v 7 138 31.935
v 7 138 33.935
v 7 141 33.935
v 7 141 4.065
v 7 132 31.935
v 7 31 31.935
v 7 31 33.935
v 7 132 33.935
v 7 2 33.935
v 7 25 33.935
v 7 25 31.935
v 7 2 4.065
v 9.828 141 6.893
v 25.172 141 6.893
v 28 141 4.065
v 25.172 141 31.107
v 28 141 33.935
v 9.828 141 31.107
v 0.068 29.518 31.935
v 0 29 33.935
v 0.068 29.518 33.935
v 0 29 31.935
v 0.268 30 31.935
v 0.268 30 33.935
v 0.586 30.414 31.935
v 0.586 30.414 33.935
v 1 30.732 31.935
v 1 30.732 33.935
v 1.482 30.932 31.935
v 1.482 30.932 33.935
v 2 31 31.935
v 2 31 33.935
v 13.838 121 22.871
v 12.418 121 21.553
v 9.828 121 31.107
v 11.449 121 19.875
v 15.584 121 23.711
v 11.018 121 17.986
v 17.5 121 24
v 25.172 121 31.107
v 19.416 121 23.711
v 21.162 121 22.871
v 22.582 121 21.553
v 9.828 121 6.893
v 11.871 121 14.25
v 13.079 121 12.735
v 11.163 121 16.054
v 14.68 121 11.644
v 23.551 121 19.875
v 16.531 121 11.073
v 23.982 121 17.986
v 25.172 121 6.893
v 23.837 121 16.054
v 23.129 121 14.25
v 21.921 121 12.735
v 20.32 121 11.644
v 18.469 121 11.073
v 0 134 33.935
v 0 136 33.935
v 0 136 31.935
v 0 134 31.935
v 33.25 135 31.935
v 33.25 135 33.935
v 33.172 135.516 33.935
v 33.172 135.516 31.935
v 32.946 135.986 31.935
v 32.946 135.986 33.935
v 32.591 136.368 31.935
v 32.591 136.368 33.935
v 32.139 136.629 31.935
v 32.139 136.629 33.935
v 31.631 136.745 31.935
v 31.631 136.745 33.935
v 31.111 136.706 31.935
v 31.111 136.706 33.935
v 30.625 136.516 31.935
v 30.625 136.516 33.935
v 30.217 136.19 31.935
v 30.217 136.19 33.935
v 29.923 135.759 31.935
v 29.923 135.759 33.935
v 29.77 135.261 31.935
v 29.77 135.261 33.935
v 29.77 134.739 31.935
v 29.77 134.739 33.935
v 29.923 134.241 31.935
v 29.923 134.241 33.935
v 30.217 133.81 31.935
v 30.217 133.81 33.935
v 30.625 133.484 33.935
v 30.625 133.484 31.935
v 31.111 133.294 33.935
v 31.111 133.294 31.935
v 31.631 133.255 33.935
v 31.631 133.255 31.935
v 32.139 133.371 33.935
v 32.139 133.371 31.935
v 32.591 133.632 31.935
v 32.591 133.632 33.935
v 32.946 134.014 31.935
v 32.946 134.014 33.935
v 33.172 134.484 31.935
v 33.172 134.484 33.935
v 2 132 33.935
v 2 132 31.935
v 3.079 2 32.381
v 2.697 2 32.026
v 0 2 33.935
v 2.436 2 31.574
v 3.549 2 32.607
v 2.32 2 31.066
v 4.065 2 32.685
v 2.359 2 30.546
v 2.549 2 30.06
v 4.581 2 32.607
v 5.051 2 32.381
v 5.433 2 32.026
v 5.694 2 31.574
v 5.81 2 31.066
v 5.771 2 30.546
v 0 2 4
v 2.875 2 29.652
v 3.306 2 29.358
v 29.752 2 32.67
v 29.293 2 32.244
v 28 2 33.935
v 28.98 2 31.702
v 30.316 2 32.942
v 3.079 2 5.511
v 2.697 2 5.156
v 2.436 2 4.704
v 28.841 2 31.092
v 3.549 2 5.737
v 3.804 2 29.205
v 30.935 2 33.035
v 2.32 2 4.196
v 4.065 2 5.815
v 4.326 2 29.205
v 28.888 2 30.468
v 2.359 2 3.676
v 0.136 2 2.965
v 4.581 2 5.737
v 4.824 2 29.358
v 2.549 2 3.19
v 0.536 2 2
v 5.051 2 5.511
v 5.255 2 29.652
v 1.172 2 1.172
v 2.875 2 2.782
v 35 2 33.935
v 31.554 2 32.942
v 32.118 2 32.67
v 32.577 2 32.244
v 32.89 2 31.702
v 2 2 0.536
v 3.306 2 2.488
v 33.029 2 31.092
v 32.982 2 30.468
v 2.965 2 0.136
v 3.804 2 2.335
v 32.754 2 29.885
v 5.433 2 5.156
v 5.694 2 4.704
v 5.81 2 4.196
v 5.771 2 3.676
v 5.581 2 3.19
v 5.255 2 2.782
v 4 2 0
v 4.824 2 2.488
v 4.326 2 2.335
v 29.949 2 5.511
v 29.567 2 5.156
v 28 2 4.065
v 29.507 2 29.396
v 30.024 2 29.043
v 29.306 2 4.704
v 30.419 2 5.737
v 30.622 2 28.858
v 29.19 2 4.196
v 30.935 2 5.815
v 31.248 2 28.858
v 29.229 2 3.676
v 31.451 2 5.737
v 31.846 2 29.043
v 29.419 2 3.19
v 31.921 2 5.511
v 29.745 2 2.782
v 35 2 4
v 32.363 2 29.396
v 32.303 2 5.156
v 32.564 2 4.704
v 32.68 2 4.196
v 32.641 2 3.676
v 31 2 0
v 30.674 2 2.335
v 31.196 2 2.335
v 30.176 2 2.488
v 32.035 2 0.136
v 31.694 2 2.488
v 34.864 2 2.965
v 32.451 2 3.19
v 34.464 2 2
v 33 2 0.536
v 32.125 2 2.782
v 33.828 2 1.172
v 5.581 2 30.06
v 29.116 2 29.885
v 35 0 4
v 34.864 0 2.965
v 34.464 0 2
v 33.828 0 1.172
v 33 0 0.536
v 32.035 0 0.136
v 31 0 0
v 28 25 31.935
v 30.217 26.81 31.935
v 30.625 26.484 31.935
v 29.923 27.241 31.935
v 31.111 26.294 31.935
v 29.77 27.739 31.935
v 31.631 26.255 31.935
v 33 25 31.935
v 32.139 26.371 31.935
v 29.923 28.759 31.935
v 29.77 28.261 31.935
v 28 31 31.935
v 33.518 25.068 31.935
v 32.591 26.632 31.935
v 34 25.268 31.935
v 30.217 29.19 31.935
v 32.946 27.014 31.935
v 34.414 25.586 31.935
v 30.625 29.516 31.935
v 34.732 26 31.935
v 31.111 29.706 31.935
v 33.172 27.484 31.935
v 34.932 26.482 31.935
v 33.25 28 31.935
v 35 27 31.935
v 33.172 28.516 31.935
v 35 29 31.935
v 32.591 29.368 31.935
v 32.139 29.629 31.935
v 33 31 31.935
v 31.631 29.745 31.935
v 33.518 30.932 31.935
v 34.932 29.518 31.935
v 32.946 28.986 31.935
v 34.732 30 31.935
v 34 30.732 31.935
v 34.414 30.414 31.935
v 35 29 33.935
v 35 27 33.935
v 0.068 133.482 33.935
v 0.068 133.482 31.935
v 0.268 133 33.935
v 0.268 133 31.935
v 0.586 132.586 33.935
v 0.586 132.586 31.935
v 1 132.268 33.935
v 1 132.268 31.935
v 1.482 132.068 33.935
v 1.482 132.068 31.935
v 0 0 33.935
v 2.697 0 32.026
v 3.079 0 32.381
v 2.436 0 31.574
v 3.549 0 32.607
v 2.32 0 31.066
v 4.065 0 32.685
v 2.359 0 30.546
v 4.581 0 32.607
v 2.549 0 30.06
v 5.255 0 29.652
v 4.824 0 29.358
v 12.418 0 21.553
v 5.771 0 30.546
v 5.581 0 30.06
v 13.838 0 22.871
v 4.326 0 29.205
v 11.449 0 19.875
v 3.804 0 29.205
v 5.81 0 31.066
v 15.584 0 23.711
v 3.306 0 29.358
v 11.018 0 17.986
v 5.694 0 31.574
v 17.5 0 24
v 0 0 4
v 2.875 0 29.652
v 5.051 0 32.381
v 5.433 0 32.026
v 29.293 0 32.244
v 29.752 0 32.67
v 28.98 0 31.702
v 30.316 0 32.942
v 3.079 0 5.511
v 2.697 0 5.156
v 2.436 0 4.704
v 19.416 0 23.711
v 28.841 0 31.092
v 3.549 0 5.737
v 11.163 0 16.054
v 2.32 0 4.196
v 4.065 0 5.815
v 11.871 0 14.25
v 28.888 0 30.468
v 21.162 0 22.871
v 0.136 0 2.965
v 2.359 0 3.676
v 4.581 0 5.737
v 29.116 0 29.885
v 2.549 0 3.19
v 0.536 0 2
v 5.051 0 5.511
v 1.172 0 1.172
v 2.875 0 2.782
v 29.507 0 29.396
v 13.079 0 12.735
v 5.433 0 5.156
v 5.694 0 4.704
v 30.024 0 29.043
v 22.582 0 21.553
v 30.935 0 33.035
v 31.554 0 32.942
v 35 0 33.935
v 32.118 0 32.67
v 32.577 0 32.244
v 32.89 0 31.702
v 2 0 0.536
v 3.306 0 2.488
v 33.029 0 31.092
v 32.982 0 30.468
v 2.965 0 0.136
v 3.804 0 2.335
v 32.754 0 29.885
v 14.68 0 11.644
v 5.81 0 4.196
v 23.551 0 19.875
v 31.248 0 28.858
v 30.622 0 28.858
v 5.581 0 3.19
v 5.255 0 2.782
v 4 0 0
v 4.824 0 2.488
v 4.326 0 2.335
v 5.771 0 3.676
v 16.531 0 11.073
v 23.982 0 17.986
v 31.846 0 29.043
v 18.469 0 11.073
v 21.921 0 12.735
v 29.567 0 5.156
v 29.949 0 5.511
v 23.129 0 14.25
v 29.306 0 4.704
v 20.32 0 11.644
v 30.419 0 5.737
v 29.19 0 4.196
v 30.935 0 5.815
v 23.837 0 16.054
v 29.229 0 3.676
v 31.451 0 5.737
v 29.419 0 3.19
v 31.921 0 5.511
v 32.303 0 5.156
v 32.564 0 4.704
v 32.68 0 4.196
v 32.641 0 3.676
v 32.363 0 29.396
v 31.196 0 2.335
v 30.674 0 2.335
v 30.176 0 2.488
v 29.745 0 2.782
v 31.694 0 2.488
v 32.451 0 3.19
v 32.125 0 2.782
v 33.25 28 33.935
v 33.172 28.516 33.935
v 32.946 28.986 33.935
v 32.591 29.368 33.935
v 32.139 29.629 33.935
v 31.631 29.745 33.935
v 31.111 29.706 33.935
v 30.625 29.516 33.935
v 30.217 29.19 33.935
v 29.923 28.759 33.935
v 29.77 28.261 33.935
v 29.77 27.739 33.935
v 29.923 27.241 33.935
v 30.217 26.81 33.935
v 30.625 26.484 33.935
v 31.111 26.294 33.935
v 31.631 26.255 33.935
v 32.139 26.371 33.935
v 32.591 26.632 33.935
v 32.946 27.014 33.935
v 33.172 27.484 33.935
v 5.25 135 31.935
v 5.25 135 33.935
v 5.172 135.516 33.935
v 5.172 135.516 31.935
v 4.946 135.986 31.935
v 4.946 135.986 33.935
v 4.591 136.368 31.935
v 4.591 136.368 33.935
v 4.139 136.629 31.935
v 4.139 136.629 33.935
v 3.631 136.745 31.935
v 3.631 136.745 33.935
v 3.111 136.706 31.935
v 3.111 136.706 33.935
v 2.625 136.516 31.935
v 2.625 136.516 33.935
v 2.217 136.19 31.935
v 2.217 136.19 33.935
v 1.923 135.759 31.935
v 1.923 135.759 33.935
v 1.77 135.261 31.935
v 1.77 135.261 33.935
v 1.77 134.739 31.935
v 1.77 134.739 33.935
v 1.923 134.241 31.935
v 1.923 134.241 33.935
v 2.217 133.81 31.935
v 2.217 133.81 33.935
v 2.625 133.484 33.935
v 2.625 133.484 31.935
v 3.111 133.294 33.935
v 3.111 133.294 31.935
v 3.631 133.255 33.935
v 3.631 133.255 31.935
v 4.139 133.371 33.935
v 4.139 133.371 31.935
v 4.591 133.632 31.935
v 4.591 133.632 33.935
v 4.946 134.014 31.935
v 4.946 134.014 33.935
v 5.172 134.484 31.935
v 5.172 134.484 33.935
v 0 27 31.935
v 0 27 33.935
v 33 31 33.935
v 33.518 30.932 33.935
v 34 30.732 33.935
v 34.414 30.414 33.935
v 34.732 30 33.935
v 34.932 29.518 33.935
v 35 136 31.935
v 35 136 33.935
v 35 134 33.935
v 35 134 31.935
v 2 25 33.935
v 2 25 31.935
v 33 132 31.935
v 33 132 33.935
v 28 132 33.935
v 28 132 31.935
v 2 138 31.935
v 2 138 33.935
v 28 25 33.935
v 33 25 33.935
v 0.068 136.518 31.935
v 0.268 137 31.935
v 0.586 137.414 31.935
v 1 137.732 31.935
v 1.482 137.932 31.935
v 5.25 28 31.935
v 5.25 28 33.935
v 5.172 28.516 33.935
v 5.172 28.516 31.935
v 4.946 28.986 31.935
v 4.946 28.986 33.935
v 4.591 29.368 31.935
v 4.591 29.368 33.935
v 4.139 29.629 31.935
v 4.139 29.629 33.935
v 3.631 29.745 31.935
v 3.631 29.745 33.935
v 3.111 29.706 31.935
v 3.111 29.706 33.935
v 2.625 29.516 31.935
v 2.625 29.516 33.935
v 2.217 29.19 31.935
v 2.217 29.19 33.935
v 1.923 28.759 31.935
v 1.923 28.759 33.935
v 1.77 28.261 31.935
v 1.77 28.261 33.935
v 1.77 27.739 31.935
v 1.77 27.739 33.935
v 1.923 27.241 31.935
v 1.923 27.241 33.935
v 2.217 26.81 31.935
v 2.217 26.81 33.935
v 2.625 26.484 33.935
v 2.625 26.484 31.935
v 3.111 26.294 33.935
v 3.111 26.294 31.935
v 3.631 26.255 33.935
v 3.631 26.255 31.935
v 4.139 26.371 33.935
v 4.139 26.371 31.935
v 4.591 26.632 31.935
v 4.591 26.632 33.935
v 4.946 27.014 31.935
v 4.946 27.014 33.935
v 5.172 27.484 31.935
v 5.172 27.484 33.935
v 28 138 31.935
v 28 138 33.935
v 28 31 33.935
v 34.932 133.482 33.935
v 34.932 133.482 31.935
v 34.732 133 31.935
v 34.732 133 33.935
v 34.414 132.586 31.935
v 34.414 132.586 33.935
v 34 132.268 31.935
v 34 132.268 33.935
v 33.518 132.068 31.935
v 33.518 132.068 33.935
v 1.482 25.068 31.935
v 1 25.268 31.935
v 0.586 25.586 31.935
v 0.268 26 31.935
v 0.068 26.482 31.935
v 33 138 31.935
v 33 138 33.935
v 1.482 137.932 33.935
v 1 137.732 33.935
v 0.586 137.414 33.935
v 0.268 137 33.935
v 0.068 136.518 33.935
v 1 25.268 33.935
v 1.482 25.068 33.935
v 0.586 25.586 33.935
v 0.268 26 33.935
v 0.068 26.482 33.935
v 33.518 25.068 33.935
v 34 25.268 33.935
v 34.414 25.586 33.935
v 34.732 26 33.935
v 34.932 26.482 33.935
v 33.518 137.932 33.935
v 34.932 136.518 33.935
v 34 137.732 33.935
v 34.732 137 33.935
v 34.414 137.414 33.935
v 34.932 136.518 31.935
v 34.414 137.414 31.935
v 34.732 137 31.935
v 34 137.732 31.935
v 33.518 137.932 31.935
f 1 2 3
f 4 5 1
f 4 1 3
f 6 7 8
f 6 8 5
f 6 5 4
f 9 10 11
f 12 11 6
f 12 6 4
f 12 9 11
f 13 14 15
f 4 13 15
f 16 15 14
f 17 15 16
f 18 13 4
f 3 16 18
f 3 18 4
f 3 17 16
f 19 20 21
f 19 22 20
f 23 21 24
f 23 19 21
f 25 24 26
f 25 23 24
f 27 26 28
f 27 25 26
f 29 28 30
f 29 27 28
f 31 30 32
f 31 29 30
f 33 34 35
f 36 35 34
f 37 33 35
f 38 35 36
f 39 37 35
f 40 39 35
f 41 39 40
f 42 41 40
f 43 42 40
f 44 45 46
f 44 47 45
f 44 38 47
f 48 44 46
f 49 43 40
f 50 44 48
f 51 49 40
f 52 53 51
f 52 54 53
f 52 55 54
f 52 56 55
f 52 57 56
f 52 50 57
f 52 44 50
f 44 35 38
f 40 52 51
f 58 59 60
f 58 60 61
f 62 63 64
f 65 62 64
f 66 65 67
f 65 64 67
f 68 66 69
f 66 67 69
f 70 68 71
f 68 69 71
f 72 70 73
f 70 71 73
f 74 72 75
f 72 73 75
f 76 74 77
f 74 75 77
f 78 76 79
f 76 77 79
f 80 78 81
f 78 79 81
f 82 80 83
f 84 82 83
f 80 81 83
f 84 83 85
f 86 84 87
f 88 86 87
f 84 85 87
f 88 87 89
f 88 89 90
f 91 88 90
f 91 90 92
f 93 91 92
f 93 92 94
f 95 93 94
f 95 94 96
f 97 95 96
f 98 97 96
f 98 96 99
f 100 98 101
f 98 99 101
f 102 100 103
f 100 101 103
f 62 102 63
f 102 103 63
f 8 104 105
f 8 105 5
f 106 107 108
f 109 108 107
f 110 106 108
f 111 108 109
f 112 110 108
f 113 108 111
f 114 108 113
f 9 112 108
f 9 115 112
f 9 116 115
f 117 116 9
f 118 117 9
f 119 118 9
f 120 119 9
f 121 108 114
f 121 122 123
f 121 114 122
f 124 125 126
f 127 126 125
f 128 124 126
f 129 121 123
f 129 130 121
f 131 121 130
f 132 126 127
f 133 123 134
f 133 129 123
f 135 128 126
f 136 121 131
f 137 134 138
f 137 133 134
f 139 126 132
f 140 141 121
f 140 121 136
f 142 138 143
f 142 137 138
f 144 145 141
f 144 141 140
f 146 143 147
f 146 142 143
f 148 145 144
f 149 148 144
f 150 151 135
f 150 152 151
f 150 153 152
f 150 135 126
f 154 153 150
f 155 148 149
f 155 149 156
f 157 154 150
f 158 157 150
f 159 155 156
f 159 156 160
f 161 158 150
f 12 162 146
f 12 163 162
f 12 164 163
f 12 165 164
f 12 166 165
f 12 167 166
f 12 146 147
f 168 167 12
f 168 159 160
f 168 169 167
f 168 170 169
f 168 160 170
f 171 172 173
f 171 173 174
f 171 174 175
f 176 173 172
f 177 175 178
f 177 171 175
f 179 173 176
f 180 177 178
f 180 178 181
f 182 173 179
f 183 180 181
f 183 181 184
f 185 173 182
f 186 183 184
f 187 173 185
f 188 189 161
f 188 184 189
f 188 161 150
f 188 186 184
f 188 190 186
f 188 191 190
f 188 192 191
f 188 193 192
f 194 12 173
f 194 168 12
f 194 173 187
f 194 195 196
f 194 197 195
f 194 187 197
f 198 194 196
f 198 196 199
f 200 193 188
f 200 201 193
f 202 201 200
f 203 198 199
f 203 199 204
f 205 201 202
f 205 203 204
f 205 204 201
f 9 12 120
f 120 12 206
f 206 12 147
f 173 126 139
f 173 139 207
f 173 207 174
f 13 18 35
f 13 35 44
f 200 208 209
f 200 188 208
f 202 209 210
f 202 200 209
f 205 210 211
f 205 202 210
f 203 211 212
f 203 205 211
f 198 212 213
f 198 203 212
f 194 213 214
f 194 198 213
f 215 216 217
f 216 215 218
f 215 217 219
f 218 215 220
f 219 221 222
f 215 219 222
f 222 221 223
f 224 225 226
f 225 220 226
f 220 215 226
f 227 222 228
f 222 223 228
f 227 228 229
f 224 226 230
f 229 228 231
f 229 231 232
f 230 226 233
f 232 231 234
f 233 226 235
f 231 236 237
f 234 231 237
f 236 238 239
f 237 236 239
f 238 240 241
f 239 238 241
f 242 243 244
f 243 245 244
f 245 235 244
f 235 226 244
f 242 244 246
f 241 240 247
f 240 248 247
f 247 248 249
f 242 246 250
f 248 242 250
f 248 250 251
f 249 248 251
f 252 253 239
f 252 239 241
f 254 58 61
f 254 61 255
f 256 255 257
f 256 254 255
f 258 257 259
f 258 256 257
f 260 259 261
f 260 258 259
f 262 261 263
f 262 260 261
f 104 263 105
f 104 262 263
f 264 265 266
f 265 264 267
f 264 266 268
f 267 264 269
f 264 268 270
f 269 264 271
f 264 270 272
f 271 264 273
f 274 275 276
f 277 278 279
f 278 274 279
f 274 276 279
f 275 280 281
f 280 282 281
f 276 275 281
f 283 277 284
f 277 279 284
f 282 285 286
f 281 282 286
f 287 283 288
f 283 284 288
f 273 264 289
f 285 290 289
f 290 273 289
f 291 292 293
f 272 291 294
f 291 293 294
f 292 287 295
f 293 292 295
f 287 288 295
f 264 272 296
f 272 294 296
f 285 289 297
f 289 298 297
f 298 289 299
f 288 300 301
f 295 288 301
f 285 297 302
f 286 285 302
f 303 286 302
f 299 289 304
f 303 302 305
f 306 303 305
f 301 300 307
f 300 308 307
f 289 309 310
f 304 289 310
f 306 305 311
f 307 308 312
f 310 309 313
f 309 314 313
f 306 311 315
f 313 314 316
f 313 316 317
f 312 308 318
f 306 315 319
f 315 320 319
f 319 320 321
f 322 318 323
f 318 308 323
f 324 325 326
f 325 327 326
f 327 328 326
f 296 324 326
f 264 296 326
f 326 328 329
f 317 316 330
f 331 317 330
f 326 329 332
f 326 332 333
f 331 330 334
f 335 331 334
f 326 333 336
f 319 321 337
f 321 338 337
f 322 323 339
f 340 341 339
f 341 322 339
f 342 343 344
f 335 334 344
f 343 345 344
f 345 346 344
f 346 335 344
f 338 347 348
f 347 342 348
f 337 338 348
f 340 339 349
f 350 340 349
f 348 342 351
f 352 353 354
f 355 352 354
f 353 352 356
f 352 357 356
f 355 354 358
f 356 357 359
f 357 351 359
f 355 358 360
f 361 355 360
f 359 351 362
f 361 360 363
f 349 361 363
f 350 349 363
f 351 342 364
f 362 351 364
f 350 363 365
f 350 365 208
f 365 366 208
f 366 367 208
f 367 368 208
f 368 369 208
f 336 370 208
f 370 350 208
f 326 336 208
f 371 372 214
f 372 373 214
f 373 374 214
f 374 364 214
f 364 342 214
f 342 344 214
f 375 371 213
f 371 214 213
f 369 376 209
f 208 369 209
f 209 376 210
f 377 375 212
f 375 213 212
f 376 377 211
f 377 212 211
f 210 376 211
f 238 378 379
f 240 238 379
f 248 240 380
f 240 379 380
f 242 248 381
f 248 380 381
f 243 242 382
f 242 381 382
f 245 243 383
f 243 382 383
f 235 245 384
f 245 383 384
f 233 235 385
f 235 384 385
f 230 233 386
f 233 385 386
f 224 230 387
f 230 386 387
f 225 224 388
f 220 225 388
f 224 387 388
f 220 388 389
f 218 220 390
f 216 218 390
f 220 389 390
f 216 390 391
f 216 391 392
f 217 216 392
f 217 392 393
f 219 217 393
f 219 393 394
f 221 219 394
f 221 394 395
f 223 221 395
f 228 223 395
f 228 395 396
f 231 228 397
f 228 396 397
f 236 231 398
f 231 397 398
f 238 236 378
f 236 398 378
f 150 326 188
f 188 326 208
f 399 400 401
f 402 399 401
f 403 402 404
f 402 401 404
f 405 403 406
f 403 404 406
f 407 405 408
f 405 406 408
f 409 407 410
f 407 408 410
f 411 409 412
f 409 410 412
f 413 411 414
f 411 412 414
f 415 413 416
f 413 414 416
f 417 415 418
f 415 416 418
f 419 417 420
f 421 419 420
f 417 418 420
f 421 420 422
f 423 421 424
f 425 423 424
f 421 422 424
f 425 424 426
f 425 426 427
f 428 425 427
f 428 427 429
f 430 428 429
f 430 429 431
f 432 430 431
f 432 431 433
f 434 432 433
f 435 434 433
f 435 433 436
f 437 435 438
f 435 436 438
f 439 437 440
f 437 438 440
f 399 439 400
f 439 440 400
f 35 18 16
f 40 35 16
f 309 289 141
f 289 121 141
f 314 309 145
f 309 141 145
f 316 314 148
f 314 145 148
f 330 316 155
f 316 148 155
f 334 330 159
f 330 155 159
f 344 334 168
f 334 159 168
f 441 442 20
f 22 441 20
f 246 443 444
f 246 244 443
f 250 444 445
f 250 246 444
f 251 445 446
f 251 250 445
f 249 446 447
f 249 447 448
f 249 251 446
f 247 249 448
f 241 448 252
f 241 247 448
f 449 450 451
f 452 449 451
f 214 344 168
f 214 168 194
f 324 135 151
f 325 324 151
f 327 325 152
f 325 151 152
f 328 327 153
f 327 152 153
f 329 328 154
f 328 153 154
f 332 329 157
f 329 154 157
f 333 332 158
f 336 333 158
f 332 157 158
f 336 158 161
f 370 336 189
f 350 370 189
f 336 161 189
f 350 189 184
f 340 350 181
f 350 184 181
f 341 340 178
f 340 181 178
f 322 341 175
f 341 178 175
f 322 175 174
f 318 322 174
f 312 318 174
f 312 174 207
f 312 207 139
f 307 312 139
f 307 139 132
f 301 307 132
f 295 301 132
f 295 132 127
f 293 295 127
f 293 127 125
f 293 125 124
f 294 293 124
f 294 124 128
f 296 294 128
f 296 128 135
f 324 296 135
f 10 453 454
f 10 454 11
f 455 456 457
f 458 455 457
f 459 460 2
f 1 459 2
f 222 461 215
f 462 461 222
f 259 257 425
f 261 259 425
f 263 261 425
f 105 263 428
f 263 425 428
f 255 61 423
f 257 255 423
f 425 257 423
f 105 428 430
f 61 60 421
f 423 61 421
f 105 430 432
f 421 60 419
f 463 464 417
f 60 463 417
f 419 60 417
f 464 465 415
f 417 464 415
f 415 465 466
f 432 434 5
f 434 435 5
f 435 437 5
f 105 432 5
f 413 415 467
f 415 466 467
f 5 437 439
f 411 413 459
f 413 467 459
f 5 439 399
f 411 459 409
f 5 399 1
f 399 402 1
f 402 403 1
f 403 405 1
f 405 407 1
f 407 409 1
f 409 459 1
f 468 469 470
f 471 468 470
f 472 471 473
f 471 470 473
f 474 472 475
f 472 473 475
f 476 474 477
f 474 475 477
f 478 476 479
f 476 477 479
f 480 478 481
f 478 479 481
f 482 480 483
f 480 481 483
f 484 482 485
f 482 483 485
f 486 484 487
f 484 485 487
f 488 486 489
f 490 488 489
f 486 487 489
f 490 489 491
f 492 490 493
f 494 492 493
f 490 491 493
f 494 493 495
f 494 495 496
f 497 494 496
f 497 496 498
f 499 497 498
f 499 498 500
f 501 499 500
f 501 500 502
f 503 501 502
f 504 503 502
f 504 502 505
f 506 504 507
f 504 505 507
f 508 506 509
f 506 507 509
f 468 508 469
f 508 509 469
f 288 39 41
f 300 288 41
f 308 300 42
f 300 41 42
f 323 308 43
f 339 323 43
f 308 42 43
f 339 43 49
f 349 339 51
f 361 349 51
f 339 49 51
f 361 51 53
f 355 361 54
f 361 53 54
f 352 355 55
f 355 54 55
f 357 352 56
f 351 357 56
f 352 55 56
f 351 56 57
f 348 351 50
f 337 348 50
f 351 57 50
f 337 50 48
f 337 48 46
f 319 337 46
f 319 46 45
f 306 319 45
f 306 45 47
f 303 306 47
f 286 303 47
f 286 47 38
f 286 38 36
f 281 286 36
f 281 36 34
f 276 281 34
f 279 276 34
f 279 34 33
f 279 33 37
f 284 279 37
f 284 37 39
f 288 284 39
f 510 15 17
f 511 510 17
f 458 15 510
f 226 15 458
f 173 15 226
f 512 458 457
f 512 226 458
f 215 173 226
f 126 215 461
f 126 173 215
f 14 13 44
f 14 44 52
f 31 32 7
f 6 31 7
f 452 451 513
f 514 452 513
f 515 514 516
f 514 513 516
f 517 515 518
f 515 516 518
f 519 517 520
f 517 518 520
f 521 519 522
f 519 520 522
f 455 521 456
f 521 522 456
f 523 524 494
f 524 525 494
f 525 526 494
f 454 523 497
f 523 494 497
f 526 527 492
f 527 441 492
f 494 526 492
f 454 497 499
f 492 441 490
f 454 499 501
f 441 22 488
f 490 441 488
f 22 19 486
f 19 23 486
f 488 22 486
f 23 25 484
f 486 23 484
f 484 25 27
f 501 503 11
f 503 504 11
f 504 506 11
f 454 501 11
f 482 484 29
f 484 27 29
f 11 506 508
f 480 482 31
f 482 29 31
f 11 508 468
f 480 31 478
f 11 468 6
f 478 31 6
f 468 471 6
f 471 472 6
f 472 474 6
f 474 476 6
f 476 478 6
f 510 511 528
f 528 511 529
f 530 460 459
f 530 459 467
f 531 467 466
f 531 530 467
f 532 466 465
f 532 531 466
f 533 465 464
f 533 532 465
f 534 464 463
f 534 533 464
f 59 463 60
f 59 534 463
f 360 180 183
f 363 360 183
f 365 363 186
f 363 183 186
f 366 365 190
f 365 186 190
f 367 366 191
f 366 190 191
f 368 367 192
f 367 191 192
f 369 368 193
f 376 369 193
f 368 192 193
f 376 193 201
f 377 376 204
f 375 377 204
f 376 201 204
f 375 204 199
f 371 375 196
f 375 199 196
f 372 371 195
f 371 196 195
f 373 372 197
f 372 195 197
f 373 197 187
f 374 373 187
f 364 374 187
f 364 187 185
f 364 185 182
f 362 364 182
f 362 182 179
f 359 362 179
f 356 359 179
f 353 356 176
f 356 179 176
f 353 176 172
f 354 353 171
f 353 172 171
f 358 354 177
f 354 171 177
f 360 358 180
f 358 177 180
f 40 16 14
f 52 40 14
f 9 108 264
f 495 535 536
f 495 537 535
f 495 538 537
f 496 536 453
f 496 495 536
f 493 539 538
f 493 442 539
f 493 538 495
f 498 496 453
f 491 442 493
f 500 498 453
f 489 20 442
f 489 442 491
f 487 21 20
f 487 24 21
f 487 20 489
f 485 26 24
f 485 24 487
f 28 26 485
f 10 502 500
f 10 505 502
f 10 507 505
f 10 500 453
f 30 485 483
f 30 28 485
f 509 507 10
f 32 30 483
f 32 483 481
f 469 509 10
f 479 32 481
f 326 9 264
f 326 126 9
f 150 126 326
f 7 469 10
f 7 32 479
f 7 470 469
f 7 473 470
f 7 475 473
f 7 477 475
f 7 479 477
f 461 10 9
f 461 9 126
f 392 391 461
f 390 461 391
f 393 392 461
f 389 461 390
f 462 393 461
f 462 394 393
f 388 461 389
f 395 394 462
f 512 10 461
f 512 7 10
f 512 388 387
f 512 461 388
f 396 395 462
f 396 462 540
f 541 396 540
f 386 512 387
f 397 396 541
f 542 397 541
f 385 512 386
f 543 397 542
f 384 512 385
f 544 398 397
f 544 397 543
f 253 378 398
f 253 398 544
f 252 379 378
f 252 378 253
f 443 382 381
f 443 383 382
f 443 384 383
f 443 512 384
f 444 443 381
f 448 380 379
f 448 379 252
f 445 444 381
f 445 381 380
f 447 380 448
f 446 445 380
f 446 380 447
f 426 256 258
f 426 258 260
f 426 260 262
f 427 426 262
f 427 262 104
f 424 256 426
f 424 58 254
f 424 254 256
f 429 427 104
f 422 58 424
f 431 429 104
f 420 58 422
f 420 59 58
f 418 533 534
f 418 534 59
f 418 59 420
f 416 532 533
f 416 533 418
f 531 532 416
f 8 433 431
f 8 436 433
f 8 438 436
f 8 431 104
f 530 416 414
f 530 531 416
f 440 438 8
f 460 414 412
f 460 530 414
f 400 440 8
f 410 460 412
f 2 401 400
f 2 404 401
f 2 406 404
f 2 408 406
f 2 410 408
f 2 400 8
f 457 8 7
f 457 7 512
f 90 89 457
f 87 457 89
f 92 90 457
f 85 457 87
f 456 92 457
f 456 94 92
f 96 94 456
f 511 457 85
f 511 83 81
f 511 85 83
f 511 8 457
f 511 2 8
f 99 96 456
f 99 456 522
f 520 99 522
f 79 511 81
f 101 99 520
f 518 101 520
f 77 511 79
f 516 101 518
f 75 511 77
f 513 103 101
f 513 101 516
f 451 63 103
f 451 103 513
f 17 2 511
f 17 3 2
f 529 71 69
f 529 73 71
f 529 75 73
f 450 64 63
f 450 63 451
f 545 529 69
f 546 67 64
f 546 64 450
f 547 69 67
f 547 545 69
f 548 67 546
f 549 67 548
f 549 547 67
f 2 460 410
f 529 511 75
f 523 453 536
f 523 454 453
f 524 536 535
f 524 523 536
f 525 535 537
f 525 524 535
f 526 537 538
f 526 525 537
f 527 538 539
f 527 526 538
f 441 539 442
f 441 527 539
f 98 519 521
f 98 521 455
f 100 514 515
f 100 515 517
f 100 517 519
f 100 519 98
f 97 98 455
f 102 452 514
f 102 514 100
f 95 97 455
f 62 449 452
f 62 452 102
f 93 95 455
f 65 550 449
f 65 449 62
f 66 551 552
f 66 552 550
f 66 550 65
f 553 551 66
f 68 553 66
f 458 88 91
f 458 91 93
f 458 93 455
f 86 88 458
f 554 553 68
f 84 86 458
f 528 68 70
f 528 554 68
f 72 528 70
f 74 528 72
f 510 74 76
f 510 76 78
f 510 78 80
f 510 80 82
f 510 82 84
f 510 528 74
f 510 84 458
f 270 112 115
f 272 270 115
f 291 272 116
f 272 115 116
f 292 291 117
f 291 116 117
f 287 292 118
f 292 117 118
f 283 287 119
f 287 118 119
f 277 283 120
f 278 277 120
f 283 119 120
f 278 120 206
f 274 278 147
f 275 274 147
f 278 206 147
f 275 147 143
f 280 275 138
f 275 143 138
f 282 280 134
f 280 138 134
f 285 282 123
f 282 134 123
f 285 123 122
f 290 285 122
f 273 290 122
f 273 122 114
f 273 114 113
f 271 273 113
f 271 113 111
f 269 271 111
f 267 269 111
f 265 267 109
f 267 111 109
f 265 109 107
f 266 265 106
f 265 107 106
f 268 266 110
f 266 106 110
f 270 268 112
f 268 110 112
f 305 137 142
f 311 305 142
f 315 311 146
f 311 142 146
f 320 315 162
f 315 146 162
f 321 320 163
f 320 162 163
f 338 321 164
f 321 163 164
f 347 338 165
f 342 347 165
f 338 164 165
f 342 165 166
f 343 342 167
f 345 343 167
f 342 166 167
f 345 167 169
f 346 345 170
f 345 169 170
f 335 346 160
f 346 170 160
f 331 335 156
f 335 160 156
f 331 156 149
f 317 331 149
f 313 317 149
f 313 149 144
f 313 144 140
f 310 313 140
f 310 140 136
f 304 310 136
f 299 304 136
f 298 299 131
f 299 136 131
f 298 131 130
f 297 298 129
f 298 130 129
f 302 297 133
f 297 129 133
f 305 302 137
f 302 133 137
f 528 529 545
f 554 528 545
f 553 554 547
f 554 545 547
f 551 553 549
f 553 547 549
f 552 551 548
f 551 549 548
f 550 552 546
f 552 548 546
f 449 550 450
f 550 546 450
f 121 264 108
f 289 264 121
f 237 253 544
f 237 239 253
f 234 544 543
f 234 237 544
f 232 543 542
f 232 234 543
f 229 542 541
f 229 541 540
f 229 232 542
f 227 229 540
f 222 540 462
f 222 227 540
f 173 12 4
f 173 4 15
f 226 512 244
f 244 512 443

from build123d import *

# Parameters (mm, degrees)
ESQUISSE1_W                  = 35
ESQUISSE1_H                  = 35
BOSS_EXTRU_1_DEPTH           = 2
ESQUISSE2_R                  = 1.75
ESQUISSE2_W                  = 35
ESQUISSE2_H                  = 1.064971157
ENL_V_MAT_EXTRU_1_DEPTH      = 2
BOSS_EXTRU_2_DEPTH           = 280
ESQUISSE5_W                  = 7
ESQUISSE5_H                  = 6
ESQUISSE5_R                  = 1.75
BOSS_EXTRU_3_DEPTH           = 2
ESQUISSE6_R                  = 1.75
BOSS_EXTRU_4_DEPTH           = 2
ESQUISSE10_W                 = 35
ESQUISSE10_H                 = 33.935028843
ESQUISSE10_R                 = 1.75
BOSS_EXTRU_5_DEPTH           = 2
ESQUISSE15_R                 = 6.5
ESQUISSE15_R_2               = 1.75
ENL_V_MAT_EXTRU_2_DEPTH      = 373
CONG_1_R                     = 2
CONG_2_R                     = 4
ESQUISSE17_R                 = 1.75
BOSS_EXTRU_6_DEPTH           = 2
ENL_V_MAT_EXTRU_3_DEPTH      = 2
ENL_V_MAT_EXTRU_4_DEPTH      = 279
ENL_V_MAT_EXTRU_4_DEPTH_BACK = 391
ESQUISSE20_W                 = 15.34314575
ESQUISSE20_H                 = 24.213203648
ENL_V_MAT_EXTRU_5_DEPTH      = 20
ESQUISSE23_R                 = 2.1
ENL_V_MAT_EXTRU_6_DEPTH      = 10


with BuildPart() as part:
    # Esquisse1 → Boss.-Extru.1 (new body)
    with BuildSketch(Plane(origin=(0, 0, 0), x_dir=(1, 0, 0), z_dir=(0, 1, 0))):
        with Locations((17.5, -17.5)):
            Rectangle(ESQUISSE1_W, ESQUISSE1_H)
    extrude(amount=BOSS_EXTRU_1_DEPTH)

    # Esquisse2 → Enlèv. mat.-Extru.1 (cut)
    with BuildSketch(Plane(origin=(0, 2, 0), x_dir=(1, 0, 0), z_dir=(0, 1, 0))):
        with Locations(Location((30.935029054, -4.064971369, 0), (0, 0, 270))):
            Circle(ESQUISSE2_R)
        with Locations(Location((30.935028843, -30.935028843, 0), (0, 0, 270))):
            Circle(ESQUISSE2_R)
        with Locations(Location((4.064971369, -4.064970946, 0), (0, 0, 270))):
            Circle(ESQUISSE2_R)
        with Locations(Location((4.064971157, -30.935028843, 0), (0, 0, 270))):
            Circle(ESQUISSE2_R)
        with Locations((17.5, -34.467514421)):
            Rectangle(ESQUISSE2_W, ESQUISSE2_H)
    extrude(amount=-ENL_V_MAT_EXTRU_1_DEPTH, mode=Mode.SUBTRACT)

    # Esquisse4 → Boss.-Extru.2 (add)
    with BuildSketch(Plane(origin=(0, 2, 0), x_dir=(1, 0, 0), z_dir=(0, 1, 0))):
        Polygon((17.5, -33.935028843), (7, -33.935028843), (7, -4.064970946), (28, -4.064970946), (28, -33.935028843), align=None)
    extrude(amount=BOSS_EXTRU_2_DEPTH)

    # Esquisse5 → Boss.-Extru.3 (add)
    # profile 1 of 4: a face of its own
    with BuildSketch(Plane.XY.offset(33.935028843)):
        with Locations((31.5, 254)):
            Rectangle(ESQUISSE5_W, ESQUISSE5_H)
        with Locations((31.5, 254)):
            Circle(ESQUISSE5_R, mode=Mode.SUBTRACT)
    # profile 2 of 4: a face of its own
    with BuildSketch(Plane.XY.offset(33.935028843)):
        with Locations((3.5, 254)):
            Rectangle(ESQUISSE5_W, ESQUISSE5_H)
        with Locations((3.5, 254)):
            Circle(ESQUISSE5_R, mode=Mode.SUBTRACT)
    # profile 3 of 4: a face of its own
    with BuildSketch(Plane.XY.offset(33.935028843)):
        with Locations((31.5, 28)):
            Rectangle(ESQUISSE5_W, ESQUISSE5_H)
        with Locations((31.5, 28)):
            Circle(ESQUISSE5_R, mode=Mode.SUBTRACT)
    # profile 4 of 4: a face of its own
    with BuildSketch(Plane.XY.offset(33.935028843)):
        with Locations((3.5, 28)):
            Rectangle(ESQUISSE5_W, ESQUISSE5_H)
        with Locations((3.5, 28)):
            Circle(ESQUISSE5_R, mode=Mode.SUBTRACT)
    extrude(amount=-BOSS_EXTRU_3_DEPTH)

    # Esquisse6 → Boss.-Extru.4 (add)
    # profile 1 of 2: a face of its own
    with BuildSketch(Plane.XY.offset(33.935028843)):
        Polygon((7, 144), (0, 144), (0, 141), (0, 138), (7, 138), (7, 141), align=None)
        with Locations((3.5, 141)):
            Circle(ESQUISSE6_R, mode=Mode.SUBTRACT)
    # profile 2 of 2: a face of its own
    with BuildSketch(Plane.XY.offset(33.935028843)):
        Polygon((35, 144), (28, 144), (28, 141), (28, 138), (35, 138), (35, 141), align=None)
        with Locations((31.5, 141)):
            Circle(ESQUISSE6_R, mode=Mode.SUBTRACT)
    extrude(amount=-BOSS_EXTRU_4_DEPTH)

    # Esquisse10 → Boss.-Extru.5 (add)
    with BuildSketch(Plane(origin=(0, 282, 0), x_dir=(1, 0, 0), z_dir=(0, 1, 0))):
        with Locations((17.5, -16.967514422)):
            Rectangle(ESQUISSE10_W, ESQUISSE10_H)
        with Locations(Location((30.935028843, -30.935028843, 0), (0, 0, 270))):
            Circle(ESQUISSE10_R, mode=Mode.SUBTRACT)
        with Locations(Location((30.935028631, -4.064970946, 0), (0, 0, 270.000013863))):
            Circle(ESQUISSE10_R, mode=Mode.SUBTRACT)
        with Locations(Location((4.064970946, -4.064971369, 0), (0, 0, 270.000013863))):
            Circle(ESQUISSE10_R, mode=Mode.SUBTRACT)
        with Locations(Location((4.064971157, -30.935028843, 0), (0, 0, 270))):
            Circle(ESQUISSE10_R, mode=Mode.SUBTRACT)
    extrude(amount=-BOSS_EXTRU_5_DEPTH)

    # Esquisse15 → Enlèv. mat.-Extru.2 (cut)
    with BuildSketch(Plane(origin=(0, 282, 0), x_dir=(1, 0, 0), z_dir=(0, 1, 0))):
        with Locations(Location((17.5, -17.5, 0), (0, 0, 270))):
            Circle(ESQUISSE15_R)
        with Locations(Location((30.935029054, -4.064971369, 0), (0, 0, 270))):
            Circle(ESQUISSE15_R_2)
    extrude(amount=-ENL_V_MAT_EXTRU_2_DEPTH, mode=Mode.SUBTRACT)

    # Congé1
    cong_1_edges = [part.edges().sort_by_distance(p)[0] for p in [
        (0, 31, 32.935028843),
        (0, 25, 32.935028843),
        (0, 144, 32.935028843),
        (0, 138, 32.935028843),
        (35, 144, 32.935028843),
        (35, 138, 32.935028843),
        (35, 257, 32.935028843),
        (35, 251, 32.935028843),
        (0, 251, 32.935028843),
        (0, 257, 32.935028843),
        (35, 31, 32.935028843),
        (35, 25, 32.935028843),
    ]]
    fillet(cong_1_edges, radius=CONG_1_R)

    # Congé2
    cong_2_edges = [part.edges().sort_by_distance(p)[0] for p in [
        (35, 281, 0),
        (0, 281, 0),
        (0, 1, 0),
        (35, 1, 0),
    ]]
    fillet(cong_2_edges, radius=CONG_2_R)

    # Esquisse17 → Boss.-Extru.6 (add)
    # profile 1 of 4: a face of its own
    with BuildSketch(Plane.XY.offset(33.935028843)):
        with BuildLine():
            Line((0, 148), (0, 146))
            ThreePointArc((0, 146), (0.585786438, 144.585786438), (2, 144))
            Line((2, 144), (7, 144))
            Line((7, 144), (7, 150))
            Line((7, 150), (2, 150))
            ThreePointArc((2, 150), (0.585786438, 149.414213562), (0, 148))
        make_face()
        with Locations((3.5, 147)):
            Circle(ESQUISSE17_R, mode=Mode.SUBTRACT)
    # profile 2 of 4: a face of its own
    with BuildSketch(Plane.XY.offset(33.935028843)):
        with BuildLine():
            Line((0, 136), (0, 134))
            ThreePointArc((0, 134), (0.585786438, 132.585786438), (2, 132))
            Line((2, 132), (7, 132))
            Line((7, 132), (7, 138))
            Line((7, 138), (2, 138))
            ThreePointArc((2, 138), (0.585786438, 137.414213562), (0, 136))
        make_face()
        with Locations((3.5, 135)):
            Circle(ESQUISSE17_R, mode=Mode.SUBTRACT)
    # profile 3 of 4: a face of its own
    with BuildSketch(Plane.XY.offset(33.935028843)):
        with BuildLine():
            ThreePointArc((35, 134), (34.414213562, 132.585786438), (33, 132))
            Line((33, 132), (28, 132))
            Line((28, 132), (28, 138))
            Line((28, 138), (33, 138))
            ThreePointArc((33, 138), (34.414213562, 137.414213562), (35, 136))
            Line((35, 136), (35, 134))
        make_face()
        with Locations((31.5, 135)):
            Circle(ESQUISSE17_R, mode=Mode.SUBTRACT)
    # profile 4 of 4: a face of its own
    with BuildSketch(Plane.XY.offset(33.935028843)):
        with BuildLine():
            ThreePointArc((35, 146), (34.414213562, 144.585786438), (33, 144))
            Line((33, 144), (28, 144))
            Line((28, 144), (28, 150))
            Line((28, 150), (33, 150))
            ThreePointArc((33, 150), (34.414213562, 149.414213562), (35, 148))
            Line((35, 148), (35, 146))
        make_face()
        with Locations((31.5, 147)):
            Circle(ESQUISSE17_R, mode=Mode.SUBTRACT)
    extrude(amount=-BOSS_EXTRU_6_DEPTH)

    # Esquisse18 → Enlèv. mat.-Extru.3 (cut)
    with BuildSketch(Plane.XY.offset(33.935028843)):
        Polygon((2, 138), (7, 138), (7, 144), (2, 144), (-2.362534847, 144), (-2.362534847, 138), align=None)
        Polygon((37.362534847, 138), (33, 138), (28, 138), (28, 144), (33, 144), (37.362534847, 144), align=None)
    extrude(amount=-ENL_V_MAT_EXTRU_3_DEPTH, mode=Mode.SUBTRACT)

    # Esquisse19 → Enlèv. mat.-Extru.4 (cut, two sides: drawn at the far end of the back side and taken through both)
    with BuildSketch(Plane(origin=(0, 0, 4.064970946), x_dir=(-1, 0, 0), z_dir=(0, 0, -1)).offset(-ENL_V_MAT_EXTRU_4_DEPTH_BACK)):
        Polygon((-28, 141), (-7, 141), (34.536866168, 141), (34.536866168, 293.648195663), (-77.45188643, 293.648195663), (-77.45188643, 143.905659046), align=None)
    extrude(amount=ENL_V_MAT_EXTRU_4_DEPTH + ENL_V_MAT_EXTRU_4_DEPTH_BACK, mode=Mode.SUBTRACT)

    # Esquisse20 → Enlèv. mat.-Extru.5 (cut)
    with BuildSketch(Plane(origin=(0, 141, 0), x_dir=(1, 0, 0), z_dir=(0, 1, 0))):
        with Locations((17.5, -18.999999894)):
            Rectangle(ESQUISSE20_W, ESQUISSE20_H)
    extrude(amount=-ENL_V_MAT_EXTRU_5_DEPTH, mode=Mode.SUBTRACT)

    # Esquisse23 → Enlèv. mat.-Extru.6 (cut)
    with BuildSketch(Plane(origin=(0, 2, 0), x_dir=(1, 0, 0), z_dir=(0, 1, 0))):
        with Locations(Location((30.935028843, -30.935028843, 0), (0, 0, 270))):
            Circle(ESQUISSE23_R)
    extrude(amount=-ENL_V_MAT_EXTRU_6_DEPTH, mode=Mode.SUBTRACT)


solid = part.part
